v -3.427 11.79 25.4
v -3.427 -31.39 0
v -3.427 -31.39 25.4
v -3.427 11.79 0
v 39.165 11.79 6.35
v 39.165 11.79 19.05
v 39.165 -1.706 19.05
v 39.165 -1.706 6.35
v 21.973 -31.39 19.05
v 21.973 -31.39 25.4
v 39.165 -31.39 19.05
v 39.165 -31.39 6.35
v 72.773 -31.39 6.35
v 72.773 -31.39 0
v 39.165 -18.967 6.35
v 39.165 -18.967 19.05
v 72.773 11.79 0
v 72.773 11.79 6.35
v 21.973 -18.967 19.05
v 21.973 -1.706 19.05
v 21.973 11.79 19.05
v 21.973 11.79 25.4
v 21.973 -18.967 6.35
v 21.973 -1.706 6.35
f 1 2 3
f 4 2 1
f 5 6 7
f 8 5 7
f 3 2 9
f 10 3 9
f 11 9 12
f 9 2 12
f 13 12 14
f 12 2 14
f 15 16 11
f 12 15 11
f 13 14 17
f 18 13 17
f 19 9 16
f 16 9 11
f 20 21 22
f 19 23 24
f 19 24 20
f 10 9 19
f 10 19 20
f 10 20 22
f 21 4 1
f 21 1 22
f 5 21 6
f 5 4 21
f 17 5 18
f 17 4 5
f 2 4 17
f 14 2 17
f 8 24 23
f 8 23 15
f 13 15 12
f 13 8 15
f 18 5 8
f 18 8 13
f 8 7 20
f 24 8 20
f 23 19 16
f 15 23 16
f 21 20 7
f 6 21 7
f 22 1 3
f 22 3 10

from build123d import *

# Parameters (mm, degrees)
F0_W     = 76.2
F0_H     = 43.18
F1_DEPTH = 25.4
F2_W     = 50.8
F2_H     = 6.35
F3_DEPTH = 43.181
F5_DEPTH = 12.7


with BuildPart() as f1:
    # F0 (on Top) → F1 (new body)
    with BuildSketch(Plane.XY):
        with Locations((34.672838, -9.800495)):
            Rectangle(F0_W, F0_H)
    extrude(amount=F1_DEPTH)

    # F2 (on face) → F3 (cut, through all)
    with BuildSketch(Plane.XZ.offset(31.390495)):
        with Locations((47.372838, 22.225)):
            Rectangle(F2_W, F2_H)
    extrude(amount=-F3_DEPTH, mode=Mode.SUBTRACT)

    # F4 (on face) → F5 (cut)
    with BuildSketch(Plane.XY.offset(19.05)):
        Polygon((39.164659, -1.706043), (21.972838, -1.706043), (21.972838, -18.966546), (39.164659, -18.966546), (39.164659, -31.390495), (72.772838, -31.390495), (72.772838, 11.789505), (39.164659, 11.789505), align=None)
    extrude(amount=-F5_DEPTH, mode=Mode.SUBTRACT)


solid = f1.part
